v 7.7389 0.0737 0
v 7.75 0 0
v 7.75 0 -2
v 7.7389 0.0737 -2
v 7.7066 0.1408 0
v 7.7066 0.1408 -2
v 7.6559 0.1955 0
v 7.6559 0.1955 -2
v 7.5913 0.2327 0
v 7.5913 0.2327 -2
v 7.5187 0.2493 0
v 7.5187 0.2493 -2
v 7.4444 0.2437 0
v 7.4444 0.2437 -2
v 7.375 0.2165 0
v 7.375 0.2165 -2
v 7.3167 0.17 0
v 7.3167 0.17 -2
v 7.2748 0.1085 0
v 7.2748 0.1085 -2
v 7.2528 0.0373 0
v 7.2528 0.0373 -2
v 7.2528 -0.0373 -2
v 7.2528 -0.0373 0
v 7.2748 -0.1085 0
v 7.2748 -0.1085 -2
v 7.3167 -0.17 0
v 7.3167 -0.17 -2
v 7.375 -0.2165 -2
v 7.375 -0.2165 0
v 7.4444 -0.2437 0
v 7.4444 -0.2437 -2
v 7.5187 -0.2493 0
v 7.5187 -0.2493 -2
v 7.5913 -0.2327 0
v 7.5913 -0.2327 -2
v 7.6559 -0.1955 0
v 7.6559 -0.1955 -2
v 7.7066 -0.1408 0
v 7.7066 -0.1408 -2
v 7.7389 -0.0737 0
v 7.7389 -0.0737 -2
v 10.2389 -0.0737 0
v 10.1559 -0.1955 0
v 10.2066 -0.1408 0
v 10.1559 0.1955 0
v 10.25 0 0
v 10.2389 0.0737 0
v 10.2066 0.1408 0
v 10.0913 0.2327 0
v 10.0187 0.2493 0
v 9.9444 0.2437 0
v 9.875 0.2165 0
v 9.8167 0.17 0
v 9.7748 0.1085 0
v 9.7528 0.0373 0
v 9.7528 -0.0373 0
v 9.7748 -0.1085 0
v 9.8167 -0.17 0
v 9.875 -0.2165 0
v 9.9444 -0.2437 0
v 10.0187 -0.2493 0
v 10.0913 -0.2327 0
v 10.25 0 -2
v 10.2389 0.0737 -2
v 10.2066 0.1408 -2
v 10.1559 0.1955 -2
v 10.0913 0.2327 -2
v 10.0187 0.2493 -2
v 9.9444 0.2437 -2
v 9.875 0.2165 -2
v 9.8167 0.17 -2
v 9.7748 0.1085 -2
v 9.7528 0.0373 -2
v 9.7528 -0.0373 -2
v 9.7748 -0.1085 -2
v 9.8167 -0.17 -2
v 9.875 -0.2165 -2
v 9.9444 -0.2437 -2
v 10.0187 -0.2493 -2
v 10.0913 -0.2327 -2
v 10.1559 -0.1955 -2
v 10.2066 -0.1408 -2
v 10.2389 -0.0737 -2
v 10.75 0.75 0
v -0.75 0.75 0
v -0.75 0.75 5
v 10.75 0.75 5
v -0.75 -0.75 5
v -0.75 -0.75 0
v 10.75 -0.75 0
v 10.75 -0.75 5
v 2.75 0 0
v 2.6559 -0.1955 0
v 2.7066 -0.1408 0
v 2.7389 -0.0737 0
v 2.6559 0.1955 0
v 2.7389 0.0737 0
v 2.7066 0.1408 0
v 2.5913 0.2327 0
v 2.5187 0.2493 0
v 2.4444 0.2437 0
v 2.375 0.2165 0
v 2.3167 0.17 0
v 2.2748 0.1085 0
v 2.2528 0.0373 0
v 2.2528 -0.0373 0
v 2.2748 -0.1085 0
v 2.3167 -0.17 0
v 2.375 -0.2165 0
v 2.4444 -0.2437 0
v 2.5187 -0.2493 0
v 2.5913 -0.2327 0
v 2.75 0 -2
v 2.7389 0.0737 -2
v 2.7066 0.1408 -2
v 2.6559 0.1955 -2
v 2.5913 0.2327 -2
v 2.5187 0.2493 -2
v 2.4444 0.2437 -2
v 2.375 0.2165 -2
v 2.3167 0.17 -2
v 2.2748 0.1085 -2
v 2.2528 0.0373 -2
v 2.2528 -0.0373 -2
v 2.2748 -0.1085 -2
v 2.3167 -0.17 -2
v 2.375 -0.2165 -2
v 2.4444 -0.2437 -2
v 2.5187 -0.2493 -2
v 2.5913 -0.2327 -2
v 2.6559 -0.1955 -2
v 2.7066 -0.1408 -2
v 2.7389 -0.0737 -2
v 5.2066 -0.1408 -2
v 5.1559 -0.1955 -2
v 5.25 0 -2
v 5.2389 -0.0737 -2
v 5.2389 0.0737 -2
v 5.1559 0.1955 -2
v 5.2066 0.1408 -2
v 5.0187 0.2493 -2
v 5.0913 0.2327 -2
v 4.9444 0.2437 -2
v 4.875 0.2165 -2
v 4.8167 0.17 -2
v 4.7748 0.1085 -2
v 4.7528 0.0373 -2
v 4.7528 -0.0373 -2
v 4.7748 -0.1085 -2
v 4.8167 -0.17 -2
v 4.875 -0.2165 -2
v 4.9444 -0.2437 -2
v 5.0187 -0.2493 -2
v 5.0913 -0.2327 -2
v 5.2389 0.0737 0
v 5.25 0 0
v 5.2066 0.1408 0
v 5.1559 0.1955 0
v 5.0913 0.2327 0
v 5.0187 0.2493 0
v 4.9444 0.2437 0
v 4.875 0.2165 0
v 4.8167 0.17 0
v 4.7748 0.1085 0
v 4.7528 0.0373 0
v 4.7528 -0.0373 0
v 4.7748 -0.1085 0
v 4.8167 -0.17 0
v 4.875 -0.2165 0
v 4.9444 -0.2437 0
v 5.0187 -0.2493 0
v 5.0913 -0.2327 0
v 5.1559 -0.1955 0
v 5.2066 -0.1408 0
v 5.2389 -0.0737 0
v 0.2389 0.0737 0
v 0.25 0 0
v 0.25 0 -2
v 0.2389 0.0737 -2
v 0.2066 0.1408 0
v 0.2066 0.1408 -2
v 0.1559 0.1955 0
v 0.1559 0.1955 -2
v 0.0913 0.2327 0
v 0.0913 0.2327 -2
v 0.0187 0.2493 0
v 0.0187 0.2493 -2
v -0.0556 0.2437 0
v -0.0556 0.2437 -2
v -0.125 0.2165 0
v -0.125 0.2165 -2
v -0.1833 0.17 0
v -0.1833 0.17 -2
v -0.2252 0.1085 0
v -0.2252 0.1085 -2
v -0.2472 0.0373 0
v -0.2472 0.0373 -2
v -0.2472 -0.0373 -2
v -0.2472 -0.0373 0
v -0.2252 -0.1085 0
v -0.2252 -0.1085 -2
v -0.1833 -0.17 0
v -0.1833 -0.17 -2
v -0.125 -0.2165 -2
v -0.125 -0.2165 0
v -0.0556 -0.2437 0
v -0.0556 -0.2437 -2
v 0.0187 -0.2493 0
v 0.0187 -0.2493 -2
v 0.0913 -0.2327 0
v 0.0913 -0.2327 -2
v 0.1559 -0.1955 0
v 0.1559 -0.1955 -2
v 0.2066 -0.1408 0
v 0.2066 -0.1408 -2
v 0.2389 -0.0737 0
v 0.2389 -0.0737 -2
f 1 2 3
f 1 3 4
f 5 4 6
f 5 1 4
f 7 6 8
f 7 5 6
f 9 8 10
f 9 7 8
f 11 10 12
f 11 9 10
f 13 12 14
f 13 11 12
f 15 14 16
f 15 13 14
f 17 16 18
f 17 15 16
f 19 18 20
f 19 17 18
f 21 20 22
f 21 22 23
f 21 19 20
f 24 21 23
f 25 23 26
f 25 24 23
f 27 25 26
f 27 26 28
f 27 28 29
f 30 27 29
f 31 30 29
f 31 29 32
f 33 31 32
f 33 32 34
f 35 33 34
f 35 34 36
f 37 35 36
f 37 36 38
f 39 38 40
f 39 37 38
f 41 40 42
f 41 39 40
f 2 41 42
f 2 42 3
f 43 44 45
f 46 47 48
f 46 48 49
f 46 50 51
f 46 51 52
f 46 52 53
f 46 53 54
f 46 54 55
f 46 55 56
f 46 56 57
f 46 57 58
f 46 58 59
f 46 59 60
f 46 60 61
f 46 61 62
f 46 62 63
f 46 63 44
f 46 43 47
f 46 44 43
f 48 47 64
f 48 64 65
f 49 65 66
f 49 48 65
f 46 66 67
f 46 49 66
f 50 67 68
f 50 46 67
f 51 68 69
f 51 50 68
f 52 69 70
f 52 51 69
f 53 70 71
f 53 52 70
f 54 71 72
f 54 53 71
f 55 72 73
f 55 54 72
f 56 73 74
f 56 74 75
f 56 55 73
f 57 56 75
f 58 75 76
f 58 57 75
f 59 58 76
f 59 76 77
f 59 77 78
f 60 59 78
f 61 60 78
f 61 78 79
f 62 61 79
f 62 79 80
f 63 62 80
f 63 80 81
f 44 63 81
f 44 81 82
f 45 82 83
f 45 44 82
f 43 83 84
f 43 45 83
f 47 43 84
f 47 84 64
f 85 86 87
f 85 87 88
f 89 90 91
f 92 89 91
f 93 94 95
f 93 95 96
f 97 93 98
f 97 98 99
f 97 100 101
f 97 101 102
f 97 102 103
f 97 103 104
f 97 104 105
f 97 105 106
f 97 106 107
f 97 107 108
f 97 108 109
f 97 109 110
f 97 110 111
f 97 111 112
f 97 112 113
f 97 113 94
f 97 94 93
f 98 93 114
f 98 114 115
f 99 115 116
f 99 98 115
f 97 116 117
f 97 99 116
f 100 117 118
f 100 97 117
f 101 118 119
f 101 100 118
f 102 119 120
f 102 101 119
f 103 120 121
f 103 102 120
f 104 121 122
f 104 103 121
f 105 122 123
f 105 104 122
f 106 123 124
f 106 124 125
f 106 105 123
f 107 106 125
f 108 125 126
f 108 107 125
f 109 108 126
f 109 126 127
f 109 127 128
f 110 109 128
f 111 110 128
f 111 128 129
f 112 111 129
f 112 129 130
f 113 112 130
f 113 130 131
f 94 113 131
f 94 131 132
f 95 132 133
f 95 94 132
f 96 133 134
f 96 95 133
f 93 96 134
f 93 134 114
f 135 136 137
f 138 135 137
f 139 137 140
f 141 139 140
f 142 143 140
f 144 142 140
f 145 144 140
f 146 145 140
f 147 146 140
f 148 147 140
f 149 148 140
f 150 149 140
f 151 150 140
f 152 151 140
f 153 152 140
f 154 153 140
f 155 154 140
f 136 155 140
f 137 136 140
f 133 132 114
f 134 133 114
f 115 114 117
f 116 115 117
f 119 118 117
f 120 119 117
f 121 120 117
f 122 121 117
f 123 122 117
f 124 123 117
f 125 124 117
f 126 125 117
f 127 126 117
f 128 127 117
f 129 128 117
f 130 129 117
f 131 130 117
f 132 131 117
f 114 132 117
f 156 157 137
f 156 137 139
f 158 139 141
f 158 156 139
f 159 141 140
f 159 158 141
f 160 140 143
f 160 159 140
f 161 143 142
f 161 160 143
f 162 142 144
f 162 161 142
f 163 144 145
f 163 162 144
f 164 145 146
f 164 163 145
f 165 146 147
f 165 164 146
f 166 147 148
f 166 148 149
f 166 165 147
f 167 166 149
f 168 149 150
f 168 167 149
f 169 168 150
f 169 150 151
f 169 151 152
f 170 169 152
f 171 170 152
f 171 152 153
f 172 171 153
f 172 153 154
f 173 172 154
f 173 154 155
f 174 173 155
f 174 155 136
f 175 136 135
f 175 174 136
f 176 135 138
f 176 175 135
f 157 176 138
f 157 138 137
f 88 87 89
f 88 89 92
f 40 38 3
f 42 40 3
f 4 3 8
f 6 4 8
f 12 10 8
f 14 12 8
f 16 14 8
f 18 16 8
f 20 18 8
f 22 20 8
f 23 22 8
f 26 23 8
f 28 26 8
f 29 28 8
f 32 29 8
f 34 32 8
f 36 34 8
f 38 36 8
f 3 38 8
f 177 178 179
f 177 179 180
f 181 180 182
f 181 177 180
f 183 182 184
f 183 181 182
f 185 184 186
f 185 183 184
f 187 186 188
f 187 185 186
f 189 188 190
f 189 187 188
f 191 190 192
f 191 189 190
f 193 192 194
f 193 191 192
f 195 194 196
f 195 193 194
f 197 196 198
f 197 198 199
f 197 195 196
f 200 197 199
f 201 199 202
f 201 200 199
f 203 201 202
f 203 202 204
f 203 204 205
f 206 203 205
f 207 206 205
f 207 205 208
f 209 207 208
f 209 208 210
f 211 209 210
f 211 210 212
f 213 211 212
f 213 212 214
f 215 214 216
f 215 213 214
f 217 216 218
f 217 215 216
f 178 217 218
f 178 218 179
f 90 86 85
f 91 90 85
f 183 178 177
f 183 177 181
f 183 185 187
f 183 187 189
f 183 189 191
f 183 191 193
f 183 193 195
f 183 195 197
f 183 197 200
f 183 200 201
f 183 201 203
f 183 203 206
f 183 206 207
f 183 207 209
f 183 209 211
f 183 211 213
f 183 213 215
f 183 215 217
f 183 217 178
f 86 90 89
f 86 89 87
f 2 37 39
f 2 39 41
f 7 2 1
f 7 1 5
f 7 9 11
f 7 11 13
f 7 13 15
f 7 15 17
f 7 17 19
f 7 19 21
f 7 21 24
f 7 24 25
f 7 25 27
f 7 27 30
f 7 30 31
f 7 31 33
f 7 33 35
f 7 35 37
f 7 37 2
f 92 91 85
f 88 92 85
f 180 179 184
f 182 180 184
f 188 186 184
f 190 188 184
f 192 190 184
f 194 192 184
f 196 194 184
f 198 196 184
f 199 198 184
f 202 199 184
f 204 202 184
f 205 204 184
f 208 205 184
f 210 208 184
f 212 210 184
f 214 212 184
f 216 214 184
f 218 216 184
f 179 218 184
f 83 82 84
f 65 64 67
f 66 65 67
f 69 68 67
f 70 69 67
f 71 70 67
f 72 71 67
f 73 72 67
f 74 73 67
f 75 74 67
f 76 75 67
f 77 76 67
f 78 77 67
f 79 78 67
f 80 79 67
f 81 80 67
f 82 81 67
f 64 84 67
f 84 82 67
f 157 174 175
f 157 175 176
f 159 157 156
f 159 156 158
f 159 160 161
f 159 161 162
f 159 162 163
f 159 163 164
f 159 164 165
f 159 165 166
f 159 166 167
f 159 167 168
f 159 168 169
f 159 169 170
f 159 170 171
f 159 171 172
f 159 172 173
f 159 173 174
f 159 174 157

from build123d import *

# Parameters (mm, degrees)
SKETCH1_W               = 11.5
SKETCH1_H               = 1.5
COMPONENT_OUTLINE_DEPTH = 5
SKETCH2_R               = 0.25
EXTRUDE_1_DEPTH         = 2
SKETCH3_R               = 0.25
EXTRUDE_2_DEPTH         = 2
SKETCH4_R               = 0.25
EXTRUDE_3_DEPTH         = 2
SKETCH5_R               = 0.25
EXTRUDE_4_DEPTH         = 2
SKETCH6_R               = 0.25
EXTRUDE_5_DEPTH         = 2


with BuildPart() as part:
    # Sketch1 → Component_Outline (new body)
    with BuildSketch(Plane.XY):
        with Locations((5, 0)):
            Rectangle(SKETCH1_W, SKETCH1_H)
    extrude(amount=COMPONENT_OUTLINE_DEPTH)


with BuildPart() as body_2:
    # Sketch2 → Extrude 1 (new body)
    with BuildSketch(Plane.XY):
        Circle(SKETCH2_R)
    extrude(amount=-EXTRUDE_1_DEPTH)


with BuildPart() as body_3:
    # Sketch3 → Extrude 2 (new body)
    with BuildSketch(Plane.XY):
        with Locations((2.5, 0)):
            Circle(SKETCH3_R)
    extrude(amount=-EXTRUDE_2_DEPTH)


with BuildPart() as body_4:
    # Sketch4 → Extrude 3 (new body)
    with BuildSketch(Plane.XY):
        with Locations((5, 0)):
            Circle(SKETCH4_R)
    extrude(amount=-EXTRUDE_3_DEPTH)


with BuildPart() as body_5:
    # Sketch5 → Extrude 4 (new body)
    with BuildSketch(Plane.XY):
        with Locations((7.5, 0)):
            Circle(SKETCH5_R)
    extrude(amount=-EXTRUDE_4_DEPTH)


with BuildPart() as body_6:
    # Sketch6 → Extrude 5 (new body)
    with BuildSketch(Plane.XY):
        with Locations((10, 0)):
            Circle(SKETCH6_R)
    extrude(amount=-EXTRUDE_5_DEPTH)


solid = Compound([part.part, body_2.part, body_3.part, body_4.part, body_5.part, body_6.part])
